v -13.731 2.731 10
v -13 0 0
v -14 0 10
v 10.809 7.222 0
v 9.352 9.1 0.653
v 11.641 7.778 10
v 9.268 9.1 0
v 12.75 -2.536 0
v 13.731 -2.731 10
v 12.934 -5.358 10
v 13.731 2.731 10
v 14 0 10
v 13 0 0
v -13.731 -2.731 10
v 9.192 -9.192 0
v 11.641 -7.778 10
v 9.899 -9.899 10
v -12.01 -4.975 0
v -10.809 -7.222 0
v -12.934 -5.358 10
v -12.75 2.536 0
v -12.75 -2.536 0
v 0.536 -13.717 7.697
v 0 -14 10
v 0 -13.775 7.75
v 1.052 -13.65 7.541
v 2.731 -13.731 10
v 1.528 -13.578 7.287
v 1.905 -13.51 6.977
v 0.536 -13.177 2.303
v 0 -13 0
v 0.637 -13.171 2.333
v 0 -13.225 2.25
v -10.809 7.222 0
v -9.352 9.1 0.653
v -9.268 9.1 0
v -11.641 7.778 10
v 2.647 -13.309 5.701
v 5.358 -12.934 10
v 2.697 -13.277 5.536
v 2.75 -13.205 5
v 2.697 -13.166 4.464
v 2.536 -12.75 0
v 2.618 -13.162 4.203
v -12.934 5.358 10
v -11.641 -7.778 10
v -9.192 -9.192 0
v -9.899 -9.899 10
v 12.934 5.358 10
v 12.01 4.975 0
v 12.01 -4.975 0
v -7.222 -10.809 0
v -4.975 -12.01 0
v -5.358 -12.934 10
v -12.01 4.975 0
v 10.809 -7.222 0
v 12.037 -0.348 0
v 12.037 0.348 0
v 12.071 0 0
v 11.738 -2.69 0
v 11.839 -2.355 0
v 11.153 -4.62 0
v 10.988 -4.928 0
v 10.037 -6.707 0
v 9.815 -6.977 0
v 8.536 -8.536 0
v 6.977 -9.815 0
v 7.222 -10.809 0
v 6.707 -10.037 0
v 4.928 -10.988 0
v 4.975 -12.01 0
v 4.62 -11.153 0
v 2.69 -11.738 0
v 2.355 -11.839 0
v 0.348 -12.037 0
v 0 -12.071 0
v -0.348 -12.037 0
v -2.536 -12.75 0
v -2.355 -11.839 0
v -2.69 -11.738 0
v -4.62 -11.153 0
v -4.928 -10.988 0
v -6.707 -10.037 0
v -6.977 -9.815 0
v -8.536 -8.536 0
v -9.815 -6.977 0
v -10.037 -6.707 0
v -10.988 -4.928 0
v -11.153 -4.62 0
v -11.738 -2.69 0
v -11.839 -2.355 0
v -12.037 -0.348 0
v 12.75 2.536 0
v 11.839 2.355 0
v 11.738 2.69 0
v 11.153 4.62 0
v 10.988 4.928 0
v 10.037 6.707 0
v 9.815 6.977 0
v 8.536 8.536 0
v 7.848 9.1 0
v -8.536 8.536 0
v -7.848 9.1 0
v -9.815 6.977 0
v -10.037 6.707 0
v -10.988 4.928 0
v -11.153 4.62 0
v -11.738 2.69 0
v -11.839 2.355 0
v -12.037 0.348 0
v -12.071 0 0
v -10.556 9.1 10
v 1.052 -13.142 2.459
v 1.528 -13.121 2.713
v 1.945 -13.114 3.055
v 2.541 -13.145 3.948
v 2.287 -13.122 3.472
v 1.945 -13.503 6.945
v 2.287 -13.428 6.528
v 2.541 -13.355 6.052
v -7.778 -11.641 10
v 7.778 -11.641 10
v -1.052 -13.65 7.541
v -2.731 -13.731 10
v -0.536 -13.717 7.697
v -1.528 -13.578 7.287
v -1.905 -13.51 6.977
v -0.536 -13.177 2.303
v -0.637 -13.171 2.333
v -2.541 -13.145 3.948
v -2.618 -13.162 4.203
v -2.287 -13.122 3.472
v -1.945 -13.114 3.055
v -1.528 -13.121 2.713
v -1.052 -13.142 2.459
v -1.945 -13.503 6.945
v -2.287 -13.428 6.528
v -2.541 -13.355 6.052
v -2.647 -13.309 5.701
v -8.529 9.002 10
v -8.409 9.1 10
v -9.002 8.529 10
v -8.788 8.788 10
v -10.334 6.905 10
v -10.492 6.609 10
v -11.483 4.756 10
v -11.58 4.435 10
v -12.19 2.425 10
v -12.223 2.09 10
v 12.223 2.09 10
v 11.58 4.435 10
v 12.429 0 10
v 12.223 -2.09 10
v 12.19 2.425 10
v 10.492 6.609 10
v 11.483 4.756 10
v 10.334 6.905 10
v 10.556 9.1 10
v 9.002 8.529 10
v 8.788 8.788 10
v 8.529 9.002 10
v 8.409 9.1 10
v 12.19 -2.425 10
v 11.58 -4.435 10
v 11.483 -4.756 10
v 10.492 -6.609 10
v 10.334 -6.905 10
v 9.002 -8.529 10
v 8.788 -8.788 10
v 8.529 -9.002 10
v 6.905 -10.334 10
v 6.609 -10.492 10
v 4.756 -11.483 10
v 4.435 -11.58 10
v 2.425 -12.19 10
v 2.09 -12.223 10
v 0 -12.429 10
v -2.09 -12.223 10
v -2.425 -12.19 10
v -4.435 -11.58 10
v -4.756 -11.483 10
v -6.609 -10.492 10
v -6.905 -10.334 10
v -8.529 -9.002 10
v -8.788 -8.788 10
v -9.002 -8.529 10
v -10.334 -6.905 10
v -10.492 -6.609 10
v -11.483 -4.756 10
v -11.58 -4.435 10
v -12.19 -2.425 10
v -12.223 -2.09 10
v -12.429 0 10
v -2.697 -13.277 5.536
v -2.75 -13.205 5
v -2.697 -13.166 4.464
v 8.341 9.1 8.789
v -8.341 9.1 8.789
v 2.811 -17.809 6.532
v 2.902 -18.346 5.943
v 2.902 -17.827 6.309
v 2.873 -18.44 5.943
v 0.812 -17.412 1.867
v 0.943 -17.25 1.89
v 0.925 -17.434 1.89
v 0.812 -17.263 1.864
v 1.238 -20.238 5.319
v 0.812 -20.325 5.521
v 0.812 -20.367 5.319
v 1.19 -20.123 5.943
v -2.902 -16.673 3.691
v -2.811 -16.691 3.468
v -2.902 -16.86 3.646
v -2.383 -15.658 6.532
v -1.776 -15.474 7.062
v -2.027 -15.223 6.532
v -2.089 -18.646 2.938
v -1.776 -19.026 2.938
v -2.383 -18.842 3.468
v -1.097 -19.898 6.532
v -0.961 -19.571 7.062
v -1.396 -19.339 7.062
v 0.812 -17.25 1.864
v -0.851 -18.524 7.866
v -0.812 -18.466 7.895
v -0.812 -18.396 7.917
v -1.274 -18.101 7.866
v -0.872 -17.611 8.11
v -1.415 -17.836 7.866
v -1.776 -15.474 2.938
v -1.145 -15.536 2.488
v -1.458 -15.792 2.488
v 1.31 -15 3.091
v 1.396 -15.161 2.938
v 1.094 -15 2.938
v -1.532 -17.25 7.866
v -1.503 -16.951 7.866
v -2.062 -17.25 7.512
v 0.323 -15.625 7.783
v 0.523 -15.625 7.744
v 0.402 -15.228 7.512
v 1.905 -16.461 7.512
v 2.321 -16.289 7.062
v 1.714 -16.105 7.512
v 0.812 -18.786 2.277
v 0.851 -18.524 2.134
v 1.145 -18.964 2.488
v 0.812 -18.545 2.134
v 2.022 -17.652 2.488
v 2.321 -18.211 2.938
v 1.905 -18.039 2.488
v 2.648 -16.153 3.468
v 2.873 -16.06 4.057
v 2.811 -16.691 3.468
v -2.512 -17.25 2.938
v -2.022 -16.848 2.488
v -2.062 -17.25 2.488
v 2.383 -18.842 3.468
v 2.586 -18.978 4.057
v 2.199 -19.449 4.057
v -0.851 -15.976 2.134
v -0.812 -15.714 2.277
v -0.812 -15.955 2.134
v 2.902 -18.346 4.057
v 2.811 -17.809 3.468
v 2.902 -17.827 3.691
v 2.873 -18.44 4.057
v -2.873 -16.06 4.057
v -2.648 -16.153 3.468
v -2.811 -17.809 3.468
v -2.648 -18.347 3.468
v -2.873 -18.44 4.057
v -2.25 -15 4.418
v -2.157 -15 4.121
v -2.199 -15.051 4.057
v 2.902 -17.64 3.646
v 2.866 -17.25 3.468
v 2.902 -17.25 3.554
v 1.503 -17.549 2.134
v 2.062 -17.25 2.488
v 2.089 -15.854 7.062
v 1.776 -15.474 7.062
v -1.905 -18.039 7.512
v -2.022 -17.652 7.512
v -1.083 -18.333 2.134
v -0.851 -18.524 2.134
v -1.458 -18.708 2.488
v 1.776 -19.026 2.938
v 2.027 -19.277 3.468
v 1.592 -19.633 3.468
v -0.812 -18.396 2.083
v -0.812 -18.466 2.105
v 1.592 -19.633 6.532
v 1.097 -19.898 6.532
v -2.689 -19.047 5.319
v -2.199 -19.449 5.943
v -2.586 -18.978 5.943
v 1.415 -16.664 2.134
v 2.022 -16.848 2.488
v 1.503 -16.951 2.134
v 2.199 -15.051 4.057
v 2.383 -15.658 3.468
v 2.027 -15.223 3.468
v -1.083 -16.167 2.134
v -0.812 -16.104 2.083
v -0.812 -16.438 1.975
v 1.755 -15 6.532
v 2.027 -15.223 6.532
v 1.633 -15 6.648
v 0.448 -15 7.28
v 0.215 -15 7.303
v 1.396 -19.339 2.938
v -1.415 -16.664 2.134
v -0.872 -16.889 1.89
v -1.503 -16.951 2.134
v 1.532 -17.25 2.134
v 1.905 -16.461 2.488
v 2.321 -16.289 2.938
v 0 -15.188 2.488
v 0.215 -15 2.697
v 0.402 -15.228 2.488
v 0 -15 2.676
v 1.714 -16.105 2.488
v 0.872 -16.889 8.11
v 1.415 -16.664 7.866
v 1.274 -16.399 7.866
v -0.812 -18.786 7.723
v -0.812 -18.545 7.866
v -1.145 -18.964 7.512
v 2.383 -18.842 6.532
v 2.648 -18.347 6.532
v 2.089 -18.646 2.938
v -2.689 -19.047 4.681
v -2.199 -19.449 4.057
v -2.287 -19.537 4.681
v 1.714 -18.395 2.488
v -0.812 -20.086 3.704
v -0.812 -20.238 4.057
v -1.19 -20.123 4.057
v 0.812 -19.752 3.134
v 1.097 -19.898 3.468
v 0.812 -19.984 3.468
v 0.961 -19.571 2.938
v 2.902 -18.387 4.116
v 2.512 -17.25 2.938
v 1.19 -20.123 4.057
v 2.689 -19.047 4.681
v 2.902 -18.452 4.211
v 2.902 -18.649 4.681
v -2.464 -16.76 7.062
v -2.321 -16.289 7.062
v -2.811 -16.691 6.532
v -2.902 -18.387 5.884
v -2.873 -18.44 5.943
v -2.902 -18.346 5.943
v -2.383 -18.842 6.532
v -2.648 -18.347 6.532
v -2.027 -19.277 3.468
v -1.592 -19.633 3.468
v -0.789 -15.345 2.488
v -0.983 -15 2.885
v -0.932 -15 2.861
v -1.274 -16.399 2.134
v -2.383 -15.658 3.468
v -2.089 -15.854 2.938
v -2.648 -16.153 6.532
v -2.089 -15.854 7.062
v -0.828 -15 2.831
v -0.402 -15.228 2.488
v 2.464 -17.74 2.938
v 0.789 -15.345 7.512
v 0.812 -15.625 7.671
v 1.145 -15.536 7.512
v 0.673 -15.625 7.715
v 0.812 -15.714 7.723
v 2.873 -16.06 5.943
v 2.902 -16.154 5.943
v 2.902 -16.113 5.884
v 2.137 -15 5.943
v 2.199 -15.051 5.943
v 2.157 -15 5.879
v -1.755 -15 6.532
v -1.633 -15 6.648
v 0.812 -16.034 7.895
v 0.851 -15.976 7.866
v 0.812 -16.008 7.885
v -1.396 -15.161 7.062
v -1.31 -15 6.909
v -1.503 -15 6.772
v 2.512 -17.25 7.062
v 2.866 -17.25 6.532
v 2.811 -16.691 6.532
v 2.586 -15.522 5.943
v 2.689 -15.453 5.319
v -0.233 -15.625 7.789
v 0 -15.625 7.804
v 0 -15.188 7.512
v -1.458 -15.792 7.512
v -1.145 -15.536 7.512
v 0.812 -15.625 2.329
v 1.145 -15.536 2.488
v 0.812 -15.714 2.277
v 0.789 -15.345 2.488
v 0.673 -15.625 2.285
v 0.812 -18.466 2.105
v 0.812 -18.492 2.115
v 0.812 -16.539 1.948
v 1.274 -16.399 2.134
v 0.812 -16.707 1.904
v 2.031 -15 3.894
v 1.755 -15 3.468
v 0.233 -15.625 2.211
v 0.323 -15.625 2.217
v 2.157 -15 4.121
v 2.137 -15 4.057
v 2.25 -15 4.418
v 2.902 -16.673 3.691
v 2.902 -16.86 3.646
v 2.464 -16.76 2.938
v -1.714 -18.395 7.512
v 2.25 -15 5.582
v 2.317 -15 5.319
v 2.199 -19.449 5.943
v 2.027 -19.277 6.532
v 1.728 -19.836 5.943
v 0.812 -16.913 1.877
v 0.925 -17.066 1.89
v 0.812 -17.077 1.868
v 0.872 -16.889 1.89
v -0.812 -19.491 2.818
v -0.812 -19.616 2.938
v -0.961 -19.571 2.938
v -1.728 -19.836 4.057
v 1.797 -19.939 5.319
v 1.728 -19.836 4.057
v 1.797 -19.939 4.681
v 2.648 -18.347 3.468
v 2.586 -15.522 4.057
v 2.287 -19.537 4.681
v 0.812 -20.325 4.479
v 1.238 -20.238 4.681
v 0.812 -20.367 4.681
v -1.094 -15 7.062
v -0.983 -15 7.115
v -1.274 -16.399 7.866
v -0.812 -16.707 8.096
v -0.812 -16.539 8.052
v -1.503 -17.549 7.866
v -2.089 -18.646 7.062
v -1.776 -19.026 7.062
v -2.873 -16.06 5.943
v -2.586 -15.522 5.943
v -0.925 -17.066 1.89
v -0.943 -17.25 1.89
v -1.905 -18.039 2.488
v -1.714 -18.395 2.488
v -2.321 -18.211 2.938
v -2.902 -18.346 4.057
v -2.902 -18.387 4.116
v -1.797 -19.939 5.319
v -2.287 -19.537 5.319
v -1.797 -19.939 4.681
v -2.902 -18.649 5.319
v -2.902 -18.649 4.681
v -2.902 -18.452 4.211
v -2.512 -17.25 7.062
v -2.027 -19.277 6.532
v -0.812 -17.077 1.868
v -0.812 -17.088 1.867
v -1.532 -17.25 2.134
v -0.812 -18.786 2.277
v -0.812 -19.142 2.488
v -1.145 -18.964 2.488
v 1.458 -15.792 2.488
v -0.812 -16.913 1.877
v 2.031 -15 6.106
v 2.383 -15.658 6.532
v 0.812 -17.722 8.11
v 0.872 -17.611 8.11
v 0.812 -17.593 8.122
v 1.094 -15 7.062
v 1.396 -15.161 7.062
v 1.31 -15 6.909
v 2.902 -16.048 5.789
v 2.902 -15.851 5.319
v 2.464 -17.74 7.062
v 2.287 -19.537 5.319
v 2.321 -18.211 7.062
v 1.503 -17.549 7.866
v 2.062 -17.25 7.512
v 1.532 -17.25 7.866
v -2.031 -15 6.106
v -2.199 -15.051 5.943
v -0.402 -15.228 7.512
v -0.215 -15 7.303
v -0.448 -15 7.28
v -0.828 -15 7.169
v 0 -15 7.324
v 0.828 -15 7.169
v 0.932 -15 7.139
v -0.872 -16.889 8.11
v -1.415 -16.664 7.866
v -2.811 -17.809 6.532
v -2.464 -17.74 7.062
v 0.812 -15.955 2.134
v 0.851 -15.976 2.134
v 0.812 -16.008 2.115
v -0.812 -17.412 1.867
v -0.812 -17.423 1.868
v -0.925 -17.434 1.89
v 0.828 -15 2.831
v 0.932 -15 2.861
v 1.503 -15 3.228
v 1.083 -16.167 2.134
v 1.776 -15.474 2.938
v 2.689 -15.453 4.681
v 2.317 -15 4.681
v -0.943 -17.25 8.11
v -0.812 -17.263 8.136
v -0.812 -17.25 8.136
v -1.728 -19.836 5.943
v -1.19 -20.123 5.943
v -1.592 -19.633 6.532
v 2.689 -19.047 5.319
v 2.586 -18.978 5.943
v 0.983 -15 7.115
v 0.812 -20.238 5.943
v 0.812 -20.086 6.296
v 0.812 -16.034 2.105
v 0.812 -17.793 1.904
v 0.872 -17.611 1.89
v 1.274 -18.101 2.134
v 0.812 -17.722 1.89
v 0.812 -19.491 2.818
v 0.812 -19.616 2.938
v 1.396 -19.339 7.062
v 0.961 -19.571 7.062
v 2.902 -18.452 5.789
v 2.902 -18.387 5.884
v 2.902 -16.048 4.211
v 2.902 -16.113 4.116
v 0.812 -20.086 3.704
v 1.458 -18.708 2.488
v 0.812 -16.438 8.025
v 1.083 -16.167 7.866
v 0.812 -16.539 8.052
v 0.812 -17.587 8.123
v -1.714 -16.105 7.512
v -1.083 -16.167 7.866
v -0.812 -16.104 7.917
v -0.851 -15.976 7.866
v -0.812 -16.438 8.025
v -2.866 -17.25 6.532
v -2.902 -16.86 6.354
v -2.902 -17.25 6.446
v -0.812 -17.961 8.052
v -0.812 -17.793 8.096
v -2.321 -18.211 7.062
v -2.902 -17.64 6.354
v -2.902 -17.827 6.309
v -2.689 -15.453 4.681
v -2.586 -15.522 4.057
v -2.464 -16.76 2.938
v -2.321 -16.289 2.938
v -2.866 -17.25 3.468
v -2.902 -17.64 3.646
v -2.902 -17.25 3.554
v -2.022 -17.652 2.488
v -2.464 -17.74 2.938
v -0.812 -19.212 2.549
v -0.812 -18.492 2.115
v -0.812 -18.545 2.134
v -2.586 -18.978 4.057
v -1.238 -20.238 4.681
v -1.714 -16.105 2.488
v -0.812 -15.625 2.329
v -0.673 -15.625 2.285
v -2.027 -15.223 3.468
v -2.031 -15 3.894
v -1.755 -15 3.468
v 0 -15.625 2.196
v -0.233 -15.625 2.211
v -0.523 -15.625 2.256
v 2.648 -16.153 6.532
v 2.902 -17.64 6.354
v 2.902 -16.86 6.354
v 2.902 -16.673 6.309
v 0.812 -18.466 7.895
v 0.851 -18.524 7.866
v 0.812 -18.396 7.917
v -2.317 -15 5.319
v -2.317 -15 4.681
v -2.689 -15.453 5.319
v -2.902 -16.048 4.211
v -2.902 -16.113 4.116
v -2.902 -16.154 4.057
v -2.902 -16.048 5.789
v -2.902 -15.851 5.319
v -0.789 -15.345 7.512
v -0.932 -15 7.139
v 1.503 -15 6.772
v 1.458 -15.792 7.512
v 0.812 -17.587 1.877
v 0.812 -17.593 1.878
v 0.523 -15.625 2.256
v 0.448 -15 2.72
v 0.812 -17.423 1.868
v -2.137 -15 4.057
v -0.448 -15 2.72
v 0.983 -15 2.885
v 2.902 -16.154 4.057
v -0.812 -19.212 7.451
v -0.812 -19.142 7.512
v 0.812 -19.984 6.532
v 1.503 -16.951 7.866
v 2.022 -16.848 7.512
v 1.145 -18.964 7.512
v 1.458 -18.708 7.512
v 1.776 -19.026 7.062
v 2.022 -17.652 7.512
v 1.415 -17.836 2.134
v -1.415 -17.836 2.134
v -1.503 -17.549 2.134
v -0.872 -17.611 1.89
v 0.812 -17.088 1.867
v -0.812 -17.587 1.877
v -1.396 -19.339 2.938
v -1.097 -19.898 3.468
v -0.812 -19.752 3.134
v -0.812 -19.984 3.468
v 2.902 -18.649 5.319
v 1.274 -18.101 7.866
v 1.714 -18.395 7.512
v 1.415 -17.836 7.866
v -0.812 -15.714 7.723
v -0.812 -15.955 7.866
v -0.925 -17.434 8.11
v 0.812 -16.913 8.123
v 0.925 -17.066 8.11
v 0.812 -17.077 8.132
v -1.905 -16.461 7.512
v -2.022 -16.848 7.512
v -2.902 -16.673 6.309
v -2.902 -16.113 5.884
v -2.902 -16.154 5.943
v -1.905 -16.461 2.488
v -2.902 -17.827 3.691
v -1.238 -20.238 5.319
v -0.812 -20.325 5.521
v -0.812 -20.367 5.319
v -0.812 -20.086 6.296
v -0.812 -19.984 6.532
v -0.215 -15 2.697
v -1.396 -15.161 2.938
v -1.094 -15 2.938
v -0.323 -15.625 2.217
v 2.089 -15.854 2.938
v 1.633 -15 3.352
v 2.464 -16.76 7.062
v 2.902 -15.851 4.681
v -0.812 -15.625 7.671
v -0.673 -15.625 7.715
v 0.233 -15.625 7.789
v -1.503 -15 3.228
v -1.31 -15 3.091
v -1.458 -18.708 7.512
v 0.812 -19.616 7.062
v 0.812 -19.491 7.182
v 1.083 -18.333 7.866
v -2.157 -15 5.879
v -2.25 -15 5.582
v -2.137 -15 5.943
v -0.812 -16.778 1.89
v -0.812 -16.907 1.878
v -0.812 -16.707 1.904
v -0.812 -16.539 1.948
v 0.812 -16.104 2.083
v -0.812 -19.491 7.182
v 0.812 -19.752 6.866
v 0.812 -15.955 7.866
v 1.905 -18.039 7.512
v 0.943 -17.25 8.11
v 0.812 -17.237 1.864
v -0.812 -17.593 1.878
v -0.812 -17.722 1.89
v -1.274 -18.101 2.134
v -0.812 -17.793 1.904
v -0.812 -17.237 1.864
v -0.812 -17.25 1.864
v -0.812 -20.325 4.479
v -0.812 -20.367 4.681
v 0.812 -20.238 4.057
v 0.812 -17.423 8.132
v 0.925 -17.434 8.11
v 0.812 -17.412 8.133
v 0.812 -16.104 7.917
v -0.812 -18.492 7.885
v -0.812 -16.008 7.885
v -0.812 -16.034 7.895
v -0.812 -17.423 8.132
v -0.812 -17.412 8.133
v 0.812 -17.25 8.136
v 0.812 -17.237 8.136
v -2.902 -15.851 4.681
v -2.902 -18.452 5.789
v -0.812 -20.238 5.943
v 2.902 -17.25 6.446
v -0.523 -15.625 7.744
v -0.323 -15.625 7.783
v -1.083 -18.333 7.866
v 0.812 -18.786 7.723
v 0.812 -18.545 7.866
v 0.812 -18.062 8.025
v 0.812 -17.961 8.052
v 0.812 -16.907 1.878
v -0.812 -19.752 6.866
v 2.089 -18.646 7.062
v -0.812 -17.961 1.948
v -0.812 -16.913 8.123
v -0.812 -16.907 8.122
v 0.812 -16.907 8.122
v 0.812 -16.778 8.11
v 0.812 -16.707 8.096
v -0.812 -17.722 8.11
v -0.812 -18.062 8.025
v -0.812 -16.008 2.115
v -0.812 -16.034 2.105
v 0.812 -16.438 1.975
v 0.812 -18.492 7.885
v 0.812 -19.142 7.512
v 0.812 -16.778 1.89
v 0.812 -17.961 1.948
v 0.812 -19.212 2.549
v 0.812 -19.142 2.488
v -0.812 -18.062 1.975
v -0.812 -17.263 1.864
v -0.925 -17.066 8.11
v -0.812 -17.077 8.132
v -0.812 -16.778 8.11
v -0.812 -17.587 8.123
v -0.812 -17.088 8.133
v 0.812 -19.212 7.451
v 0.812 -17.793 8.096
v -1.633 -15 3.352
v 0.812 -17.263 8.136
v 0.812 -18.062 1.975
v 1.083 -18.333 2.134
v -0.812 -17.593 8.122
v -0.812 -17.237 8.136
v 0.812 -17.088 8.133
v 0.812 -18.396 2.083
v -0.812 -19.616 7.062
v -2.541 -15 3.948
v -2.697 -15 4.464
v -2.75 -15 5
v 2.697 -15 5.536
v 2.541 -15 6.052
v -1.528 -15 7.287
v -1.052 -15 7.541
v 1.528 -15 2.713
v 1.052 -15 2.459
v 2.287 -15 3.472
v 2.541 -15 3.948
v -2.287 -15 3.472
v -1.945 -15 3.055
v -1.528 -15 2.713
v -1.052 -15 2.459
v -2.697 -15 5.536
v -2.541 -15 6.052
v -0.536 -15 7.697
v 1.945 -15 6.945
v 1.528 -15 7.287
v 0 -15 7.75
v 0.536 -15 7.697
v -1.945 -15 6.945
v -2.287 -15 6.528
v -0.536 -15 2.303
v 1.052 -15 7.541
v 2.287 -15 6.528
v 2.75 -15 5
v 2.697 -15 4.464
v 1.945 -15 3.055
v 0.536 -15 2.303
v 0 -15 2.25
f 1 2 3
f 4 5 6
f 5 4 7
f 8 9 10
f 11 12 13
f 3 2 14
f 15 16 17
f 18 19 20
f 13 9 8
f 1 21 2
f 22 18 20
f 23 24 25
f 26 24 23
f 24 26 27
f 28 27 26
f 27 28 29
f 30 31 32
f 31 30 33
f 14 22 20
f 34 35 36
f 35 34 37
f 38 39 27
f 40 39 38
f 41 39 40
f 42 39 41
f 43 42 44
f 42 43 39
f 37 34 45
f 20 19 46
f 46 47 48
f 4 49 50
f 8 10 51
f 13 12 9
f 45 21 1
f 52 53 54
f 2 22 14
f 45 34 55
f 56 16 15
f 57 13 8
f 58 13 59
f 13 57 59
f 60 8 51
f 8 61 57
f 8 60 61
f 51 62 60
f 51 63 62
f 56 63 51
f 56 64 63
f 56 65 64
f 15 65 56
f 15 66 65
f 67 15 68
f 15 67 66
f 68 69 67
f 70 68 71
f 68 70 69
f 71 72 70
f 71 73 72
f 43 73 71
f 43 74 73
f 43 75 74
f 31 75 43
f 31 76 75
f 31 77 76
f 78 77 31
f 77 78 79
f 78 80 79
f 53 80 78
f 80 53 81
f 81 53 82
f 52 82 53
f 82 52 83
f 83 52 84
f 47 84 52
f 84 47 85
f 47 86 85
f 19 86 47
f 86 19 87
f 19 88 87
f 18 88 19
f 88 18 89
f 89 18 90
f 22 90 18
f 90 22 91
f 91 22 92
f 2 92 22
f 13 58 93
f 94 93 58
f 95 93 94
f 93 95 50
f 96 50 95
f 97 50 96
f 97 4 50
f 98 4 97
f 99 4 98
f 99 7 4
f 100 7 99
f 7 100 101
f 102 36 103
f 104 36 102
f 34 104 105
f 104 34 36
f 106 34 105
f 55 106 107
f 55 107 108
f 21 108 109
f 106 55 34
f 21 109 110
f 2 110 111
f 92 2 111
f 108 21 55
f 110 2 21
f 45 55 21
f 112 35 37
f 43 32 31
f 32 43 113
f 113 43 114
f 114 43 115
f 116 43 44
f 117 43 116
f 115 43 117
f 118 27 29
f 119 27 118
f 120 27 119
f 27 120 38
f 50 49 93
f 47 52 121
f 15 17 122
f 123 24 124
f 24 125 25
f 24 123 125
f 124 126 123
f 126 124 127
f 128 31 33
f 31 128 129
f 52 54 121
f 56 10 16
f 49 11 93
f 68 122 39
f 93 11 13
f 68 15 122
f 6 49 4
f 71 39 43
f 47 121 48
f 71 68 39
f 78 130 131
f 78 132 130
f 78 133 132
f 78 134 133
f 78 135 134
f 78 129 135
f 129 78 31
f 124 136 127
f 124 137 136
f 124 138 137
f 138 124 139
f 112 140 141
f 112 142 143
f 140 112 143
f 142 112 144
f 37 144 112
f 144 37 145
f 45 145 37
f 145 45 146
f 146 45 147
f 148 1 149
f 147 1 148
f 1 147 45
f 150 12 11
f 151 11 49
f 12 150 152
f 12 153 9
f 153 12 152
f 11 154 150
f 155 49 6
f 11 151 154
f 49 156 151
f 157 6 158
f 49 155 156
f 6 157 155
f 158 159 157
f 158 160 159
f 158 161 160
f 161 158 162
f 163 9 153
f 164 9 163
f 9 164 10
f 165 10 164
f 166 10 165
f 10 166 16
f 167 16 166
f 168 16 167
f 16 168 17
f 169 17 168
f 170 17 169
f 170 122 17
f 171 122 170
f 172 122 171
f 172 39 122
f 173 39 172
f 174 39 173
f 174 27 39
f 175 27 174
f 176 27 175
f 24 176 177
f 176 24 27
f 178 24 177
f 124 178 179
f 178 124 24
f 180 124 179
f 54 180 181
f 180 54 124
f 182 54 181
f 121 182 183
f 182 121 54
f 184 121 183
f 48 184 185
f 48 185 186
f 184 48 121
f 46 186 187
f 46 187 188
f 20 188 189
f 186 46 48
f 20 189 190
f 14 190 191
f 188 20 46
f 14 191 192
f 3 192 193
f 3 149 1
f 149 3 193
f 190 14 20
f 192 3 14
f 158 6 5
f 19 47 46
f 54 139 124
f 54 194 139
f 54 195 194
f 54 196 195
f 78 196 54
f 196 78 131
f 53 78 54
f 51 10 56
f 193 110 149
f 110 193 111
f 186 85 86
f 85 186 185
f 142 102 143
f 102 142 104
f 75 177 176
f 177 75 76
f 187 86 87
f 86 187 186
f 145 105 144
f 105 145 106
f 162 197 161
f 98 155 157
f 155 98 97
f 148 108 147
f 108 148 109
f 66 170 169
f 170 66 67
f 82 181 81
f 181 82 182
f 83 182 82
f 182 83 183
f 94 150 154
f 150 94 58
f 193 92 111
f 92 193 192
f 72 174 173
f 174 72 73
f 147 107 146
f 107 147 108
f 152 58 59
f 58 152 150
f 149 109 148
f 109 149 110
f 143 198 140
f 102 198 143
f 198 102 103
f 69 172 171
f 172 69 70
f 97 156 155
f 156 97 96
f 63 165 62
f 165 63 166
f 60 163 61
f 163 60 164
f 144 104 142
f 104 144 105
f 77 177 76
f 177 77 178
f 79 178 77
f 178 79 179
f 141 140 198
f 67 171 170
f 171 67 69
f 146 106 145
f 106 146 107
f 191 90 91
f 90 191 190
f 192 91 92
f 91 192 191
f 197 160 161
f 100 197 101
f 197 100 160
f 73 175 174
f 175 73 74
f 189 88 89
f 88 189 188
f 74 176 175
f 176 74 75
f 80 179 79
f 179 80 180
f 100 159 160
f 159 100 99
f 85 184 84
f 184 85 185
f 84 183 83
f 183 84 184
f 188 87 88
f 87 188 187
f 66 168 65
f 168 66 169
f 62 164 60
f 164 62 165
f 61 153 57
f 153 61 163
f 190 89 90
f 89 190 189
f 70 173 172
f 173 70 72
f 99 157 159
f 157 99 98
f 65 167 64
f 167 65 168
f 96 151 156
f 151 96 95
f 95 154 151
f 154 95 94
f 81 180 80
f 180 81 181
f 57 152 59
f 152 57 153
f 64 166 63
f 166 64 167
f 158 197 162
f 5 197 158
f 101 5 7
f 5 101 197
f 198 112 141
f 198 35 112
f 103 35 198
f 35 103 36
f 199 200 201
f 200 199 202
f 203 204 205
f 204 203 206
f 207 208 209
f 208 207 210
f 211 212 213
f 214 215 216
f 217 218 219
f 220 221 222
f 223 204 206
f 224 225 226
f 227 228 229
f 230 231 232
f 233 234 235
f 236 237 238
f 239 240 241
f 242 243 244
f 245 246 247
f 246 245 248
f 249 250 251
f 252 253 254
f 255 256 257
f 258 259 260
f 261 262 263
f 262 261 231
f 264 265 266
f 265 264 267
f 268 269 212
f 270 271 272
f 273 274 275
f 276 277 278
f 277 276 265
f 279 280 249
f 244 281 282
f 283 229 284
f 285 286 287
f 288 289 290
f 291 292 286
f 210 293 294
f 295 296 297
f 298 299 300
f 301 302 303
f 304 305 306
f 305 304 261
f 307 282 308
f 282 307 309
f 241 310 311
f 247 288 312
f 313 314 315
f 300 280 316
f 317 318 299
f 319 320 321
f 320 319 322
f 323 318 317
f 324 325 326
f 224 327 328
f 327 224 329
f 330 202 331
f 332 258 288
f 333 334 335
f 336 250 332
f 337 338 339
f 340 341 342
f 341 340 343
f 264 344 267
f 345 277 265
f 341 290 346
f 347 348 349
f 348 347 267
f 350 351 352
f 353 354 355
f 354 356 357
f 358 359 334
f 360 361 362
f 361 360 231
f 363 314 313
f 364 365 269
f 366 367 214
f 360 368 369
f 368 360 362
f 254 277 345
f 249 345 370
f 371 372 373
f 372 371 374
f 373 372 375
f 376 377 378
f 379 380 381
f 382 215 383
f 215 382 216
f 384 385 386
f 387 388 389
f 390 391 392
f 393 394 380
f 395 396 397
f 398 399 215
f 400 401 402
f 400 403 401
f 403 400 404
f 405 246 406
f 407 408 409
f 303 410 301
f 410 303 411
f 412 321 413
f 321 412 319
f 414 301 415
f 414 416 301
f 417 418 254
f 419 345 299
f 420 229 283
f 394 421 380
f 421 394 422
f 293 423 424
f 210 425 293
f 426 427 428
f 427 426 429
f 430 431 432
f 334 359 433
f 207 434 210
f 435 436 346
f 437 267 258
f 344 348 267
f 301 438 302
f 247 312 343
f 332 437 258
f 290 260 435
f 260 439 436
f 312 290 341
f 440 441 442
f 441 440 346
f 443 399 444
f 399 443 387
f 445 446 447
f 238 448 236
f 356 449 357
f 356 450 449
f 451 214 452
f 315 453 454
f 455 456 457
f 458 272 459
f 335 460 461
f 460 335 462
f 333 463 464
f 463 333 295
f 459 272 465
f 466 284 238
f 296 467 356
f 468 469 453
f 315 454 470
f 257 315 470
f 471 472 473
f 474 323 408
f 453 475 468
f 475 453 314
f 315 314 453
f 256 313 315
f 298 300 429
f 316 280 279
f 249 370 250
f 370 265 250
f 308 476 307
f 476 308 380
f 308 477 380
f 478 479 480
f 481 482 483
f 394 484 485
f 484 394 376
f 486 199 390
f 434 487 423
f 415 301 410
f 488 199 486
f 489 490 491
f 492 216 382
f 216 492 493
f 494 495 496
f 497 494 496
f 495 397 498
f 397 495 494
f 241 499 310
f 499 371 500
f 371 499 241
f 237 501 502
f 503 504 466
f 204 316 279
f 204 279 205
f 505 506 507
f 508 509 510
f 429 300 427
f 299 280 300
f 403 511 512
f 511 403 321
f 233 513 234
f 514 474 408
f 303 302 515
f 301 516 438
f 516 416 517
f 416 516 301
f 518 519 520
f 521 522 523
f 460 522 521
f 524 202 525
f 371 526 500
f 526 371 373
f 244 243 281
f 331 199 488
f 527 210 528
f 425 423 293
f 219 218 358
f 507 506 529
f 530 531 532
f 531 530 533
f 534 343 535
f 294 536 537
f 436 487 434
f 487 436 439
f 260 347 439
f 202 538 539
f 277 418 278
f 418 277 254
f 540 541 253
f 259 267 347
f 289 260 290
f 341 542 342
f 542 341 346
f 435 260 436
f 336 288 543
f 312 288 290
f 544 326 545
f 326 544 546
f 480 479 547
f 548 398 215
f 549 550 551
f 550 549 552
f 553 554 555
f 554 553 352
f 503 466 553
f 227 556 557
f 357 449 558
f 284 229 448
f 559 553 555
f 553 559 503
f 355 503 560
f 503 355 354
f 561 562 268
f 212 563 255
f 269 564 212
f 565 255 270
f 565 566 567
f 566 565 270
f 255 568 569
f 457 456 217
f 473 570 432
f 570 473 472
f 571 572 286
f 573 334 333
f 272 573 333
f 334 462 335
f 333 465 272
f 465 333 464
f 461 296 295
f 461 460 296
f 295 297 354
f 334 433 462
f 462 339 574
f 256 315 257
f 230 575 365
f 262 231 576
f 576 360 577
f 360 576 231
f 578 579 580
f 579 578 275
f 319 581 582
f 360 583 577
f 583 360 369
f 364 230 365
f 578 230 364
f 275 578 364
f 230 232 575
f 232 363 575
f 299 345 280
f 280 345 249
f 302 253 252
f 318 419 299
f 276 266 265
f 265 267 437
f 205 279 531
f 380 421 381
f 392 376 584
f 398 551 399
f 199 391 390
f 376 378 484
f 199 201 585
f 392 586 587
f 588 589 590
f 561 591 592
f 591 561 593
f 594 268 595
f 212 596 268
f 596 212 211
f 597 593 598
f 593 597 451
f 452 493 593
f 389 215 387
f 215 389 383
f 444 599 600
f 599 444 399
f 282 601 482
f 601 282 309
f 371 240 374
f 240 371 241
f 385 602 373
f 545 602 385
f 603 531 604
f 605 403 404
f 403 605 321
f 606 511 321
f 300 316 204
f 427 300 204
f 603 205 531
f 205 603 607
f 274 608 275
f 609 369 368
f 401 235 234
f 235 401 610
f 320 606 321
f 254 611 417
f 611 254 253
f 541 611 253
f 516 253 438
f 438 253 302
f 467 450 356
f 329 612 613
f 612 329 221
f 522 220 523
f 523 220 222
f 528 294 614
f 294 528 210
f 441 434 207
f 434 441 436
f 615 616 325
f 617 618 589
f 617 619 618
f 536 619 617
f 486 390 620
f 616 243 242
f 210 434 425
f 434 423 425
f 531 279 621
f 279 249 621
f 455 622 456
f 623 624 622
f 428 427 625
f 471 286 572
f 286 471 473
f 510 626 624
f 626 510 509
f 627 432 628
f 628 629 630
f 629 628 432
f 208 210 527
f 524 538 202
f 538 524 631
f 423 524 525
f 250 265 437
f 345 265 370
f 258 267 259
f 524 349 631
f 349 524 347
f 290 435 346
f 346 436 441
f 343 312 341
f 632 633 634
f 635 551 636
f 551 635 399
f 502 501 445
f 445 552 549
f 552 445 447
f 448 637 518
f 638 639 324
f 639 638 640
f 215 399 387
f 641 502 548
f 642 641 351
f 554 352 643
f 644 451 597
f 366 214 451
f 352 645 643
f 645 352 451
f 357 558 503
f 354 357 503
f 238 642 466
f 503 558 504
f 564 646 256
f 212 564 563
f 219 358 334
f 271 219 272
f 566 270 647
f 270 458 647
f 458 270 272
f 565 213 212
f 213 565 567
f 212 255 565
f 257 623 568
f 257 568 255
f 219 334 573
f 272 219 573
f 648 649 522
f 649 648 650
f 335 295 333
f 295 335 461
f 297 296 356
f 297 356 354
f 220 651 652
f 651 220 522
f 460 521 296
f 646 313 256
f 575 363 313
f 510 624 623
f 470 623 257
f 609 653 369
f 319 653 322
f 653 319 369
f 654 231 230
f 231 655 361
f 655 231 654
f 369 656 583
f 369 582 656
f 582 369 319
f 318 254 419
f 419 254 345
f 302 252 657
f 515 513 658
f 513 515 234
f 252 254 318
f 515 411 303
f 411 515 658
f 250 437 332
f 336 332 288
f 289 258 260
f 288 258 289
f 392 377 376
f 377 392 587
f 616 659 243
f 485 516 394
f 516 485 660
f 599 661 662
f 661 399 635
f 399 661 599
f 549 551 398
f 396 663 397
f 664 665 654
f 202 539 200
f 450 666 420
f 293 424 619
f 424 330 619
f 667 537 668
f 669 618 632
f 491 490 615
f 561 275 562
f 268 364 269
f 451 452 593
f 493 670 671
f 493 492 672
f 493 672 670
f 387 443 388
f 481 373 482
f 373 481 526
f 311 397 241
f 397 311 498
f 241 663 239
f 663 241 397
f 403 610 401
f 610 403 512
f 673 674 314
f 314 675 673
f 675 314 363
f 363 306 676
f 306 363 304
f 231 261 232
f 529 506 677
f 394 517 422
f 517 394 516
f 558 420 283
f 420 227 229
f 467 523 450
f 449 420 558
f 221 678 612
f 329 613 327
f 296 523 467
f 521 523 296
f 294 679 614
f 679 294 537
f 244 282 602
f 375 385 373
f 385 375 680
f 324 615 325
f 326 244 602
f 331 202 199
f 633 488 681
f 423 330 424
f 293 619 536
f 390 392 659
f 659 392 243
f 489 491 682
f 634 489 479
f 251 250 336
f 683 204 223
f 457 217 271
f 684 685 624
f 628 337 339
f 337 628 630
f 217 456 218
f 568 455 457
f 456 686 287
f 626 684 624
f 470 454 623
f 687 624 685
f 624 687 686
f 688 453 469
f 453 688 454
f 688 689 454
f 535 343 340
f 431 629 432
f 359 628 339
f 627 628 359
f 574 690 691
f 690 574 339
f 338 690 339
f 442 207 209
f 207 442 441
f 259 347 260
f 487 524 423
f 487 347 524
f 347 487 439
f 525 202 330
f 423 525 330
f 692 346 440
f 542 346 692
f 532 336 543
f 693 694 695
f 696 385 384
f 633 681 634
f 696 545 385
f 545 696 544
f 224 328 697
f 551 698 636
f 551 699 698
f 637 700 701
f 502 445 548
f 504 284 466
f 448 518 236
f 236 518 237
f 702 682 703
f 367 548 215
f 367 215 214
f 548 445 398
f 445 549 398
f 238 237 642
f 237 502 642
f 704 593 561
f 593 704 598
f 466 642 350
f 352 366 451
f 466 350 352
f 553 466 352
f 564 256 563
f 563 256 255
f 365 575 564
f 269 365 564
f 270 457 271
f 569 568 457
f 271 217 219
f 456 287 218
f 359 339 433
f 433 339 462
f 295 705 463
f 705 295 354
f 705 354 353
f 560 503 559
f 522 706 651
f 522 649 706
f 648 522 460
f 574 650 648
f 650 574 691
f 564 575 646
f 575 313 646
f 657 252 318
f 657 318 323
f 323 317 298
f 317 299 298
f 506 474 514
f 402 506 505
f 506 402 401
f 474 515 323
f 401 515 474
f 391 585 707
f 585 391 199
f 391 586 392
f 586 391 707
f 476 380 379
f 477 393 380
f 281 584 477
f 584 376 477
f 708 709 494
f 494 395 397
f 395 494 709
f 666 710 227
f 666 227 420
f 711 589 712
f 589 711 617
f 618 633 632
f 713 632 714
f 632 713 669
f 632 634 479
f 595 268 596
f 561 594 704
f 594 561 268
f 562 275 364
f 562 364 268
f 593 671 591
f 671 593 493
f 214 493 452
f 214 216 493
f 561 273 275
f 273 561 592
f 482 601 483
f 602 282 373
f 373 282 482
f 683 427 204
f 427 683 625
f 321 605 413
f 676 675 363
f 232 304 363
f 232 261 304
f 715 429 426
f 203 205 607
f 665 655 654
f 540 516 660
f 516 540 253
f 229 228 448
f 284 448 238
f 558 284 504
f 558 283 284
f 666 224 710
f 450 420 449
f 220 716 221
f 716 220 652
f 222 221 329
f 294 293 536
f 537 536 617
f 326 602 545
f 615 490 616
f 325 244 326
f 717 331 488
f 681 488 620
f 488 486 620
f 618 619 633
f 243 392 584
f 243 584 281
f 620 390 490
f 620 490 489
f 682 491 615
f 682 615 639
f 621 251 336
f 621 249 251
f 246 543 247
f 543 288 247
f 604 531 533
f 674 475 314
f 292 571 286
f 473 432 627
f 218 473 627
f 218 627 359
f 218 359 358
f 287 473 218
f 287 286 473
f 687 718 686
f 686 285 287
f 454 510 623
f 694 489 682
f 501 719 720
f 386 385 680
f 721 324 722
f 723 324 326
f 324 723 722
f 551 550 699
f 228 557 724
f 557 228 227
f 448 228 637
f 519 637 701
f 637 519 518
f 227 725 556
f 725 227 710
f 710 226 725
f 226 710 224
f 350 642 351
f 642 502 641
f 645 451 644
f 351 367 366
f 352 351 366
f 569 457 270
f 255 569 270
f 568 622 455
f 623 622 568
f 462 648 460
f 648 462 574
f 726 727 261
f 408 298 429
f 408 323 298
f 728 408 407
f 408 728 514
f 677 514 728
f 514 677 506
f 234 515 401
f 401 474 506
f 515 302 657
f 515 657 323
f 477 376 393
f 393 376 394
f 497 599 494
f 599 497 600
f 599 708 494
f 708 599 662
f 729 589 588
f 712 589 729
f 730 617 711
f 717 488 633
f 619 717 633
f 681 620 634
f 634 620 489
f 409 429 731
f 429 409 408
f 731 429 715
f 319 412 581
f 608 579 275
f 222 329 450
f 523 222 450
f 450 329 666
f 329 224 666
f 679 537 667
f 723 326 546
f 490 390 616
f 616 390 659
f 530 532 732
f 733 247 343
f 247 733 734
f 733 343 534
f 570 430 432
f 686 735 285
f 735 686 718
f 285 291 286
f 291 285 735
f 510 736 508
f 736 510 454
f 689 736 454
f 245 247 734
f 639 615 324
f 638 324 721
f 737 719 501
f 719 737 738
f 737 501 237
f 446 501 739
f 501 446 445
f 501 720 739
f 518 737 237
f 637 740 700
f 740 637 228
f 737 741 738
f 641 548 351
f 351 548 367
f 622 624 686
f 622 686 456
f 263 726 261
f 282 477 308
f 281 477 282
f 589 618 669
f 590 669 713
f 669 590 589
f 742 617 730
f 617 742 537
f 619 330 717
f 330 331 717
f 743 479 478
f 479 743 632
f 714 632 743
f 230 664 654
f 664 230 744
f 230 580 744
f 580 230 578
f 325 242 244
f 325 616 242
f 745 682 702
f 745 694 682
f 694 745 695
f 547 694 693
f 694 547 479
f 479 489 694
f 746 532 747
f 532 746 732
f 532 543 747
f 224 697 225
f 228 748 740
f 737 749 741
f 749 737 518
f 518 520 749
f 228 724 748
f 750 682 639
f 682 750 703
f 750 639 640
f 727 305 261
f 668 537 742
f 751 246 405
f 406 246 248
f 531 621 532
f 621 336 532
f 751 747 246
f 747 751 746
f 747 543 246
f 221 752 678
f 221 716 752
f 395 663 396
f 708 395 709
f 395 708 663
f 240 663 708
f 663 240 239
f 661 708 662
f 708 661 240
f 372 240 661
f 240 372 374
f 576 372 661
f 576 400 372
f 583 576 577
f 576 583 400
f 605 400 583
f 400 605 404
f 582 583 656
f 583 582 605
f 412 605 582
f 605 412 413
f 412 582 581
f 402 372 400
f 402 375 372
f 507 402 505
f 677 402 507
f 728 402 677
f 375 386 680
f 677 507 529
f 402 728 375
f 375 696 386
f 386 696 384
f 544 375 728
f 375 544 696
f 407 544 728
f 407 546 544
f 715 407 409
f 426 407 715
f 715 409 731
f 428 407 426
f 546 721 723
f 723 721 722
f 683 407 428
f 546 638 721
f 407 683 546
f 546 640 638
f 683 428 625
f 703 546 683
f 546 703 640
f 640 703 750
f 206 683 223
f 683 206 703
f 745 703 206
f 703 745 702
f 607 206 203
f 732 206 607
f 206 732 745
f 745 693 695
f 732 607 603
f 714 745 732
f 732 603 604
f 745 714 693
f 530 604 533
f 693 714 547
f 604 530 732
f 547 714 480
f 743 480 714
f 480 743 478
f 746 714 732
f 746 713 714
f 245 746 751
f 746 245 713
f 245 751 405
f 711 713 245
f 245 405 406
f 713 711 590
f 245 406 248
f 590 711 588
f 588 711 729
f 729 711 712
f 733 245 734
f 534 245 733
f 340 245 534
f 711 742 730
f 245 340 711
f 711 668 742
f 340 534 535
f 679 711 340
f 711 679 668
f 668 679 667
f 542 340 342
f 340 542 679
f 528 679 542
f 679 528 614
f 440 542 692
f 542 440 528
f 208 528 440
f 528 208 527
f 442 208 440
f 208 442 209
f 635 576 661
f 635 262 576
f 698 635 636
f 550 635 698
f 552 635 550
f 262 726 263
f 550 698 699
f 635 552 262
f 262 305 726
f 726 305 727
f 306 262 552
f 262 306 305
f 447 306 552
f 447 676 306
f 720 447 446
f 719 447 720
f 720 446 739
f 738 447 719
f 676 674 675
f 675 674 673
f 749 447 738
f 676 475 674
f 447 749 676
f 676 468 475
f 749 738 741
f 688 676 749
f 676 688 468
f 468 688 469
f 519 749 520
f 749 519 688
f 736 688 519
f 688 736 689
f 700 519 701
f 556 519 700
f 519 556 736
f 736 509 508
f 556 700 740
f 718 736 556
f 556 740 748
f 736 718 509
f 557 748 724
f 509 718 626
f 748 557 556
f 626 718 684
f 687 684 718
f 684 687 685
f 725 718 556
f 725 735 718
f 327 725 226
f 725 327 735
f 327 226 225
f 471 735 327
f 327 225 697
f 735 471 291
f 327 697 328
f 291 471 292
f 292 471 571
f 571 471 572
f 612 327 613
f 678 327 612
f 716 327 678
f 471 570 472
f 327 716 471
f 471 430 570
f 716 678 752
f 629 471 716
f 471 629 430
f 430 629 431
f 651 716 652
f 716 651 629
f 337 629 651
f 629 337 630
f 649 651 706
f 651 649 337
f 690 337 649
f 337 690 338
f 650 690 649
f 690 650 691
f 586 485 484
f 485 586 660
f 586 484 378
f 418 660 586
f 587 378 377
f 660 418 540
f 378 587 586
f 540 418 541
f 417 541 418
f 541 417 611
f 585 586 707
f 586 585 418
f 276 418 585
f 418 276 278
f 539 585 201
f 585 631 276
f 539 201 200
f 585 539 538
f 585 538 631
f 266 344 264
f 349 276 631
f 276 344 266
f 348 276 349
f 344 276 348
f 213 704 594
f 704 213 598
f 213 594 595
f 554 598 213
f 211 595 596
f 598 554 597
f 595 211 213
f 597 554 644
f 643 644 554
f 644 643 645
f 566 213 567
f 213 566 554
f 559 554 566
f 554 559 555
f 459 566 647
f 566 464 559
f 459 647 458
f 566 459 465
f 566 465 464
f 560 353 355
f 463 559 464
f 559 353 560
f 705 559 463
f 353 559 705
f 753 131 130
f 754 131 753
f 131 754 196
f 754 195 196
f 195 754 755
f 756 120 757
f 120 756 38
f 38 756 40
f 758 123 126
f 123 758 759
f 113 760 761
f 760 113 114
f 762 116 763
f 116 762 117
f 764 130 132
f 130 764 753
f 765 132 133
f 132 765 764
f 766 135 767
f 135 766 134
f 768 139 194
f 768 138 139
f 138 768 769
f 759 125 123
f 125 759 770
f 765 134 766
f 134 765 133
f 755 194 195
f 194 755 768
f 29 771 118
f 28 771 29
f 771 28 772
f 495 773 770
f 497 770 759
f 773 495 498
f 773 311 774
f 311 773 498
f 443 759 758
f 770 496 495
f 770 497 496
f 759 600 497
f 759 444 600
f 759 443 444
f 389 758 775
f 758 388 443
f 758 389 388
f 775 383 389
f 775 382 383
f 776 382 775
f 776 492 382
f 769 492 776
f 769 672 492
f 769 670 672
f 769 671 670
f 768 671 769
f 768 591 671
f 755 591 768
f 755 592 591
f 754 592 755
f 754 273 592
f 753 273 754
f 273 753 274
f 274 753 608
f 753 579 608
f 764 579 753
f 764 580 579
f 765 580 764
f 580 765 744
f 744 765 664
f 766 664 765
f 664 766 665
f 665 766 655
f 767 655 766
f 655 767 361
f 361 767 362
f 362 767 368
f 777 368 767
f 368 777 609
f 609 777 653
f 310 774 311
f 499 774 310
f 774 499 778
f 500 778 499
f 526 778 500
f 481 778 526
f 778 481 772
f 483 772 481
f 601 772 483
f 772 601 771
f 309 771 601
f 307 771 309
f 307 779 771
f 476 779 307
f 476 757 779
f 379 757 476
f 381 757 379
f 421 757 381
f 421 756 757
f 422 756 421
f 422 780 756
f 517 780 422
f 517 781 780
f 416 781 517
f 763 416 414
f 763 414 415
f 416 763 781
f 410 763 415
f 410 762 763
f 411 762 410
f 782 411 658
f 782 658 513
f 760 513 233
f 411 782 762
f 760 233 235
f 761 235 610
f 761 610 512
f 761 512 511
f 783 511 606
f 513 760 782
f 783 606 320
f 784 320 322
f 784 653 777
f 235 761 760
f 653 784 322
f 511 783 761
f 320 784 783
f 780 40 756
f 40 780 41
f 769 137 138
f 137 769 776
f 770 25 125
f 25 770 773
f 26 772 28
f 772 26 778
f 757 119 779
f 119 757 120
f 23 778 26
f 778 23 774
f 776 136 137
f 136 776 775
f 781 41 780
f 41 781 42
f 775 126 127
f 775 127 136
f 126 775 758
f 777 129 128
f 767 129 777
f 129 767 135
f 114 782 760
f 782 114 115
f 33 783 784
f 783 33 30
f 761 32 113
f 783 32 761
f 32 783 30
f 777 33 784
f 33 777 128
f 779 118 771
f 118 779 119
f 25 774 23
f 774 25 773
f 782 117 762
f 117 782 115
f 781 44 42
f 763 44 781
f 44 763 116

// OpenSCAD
// Tool Handle Diameter (in mm); max size is about 24 mm if doing multiple connected
tool_dia = 24;
// Thickness of the tool holder
shell_width = 2;
// Height of your tool holder (10mm is a good guess)
holder_height = 10;
// Peg Hole Size (6.5 is good for US)
peg_size = 6.5;
// Peg Length is the thickness of your peg board
peg_length = 2;
// Peg Spacing, US=25.4; Metric=25??
peg_spacing = 25.4;
// Number of holders
number_of_holders = 1;
// Arrangement, grid, inline, inline_connected
arrangement = "inline"; //[grid, inline]
// Grid rows, duplicates number_of_holders on multiple "rows"
grid_rows = 1;
// Front Cutout Percent; if you want an opening in the front, this is about how much of the ring to cut out.  .25 = 25% is a good start
front_cutout_percent = .15;
// Connected [yes,no] Adds a support brace across each row
connected = "yes"; // [yes,no]

/* [Hidden] */
outer_dia = tool_dia + (shell_width);
$fn=32;


// Loop
if(arrangement=="inline")
    for(n=[0:1:number_of_holders-1])
        translate([n*peg_spacing,0,5]) tool_holder(n);

if(arrangement=="grid")
    for(gr=[0:1:grid_rows-1])
        for(n=[0:1:number_of_holders-1])
            translate([n*peg_spacing,
                      gr*(outer_dia),
                      0]) tool_holder(n);

// Modules
module supports() {
}    

module connector(cn) {
    translate([cn>0?0:cn==0?-peg_spacing/4:peg_spacing/4,
                -outer_dia/2
                ,0]) 
            rotate([0,-90,-90]) 
                cube([holder_height,
                    cn>0?(peg_spacing)
                         :(peg_spacing/2),
                    shell_width*.75],center=true);
}
// tool shell
module tool_holder(hn) {
    rotate([0,-180,0]) union() {
        difference() {
            //outer shell
            cylinder(r1=(outer_dia/2)+(shell_width/2),
                     r2=(outer_dia/2),
                     h=holder_height,center=true);
            //inner cutout
            color("red") cylinder(r1=(outer_dia-(shell_width/2))/2,
                     r2=(tool_dia/2),
                     h=4+holder_height,center=true);
        // opening cutout
            if(front_cutout_percent!=0) translate([0,outer_dia*(1-front_cutout_percent),0]) color("pink") cube([outer_dia,outer_dia,holder_height],center=true);
        }
        // peg body
            union() {
                // peg leg
                color("green") translate([0,-((outer_dia/2)),0]) rotate([90,0,0]) cylinder(r=(peg_size-1)/2,h=peg_length);
                // peg head
                translate([0,-((peg_size/2)+(outer_dia/2)+(peg_length-(shell_width/2))),0]) peg_head();
     if(connected=="yes" && number_of_holders>1)
                if(hn==0)
                    color("red") connector(0); // start
                else if(hn==number_of_holders-1) 
                    color("blue") connector(-1); // end
                else connector(hn); // middle
            }
    }
}
module peg_head() {
    difference() {    
     // peg head
        sphere(r=peg_size/2);
        // peg slot clipping rectangle
        translate([0,-(peg_size/4),0]) rotate([0,0,-90]) cube([peg_size,peg_size/4,peg_size],center=true);
        // peg clipping side rectangles
        translate([-peg_size/1.75,0,0]) rotate([0,0,-90]) cube([peg_size/2,peg_size/4,peg_size],center=true);
        translate([peg_size/1.75,0,0]) rotate([0,0,-90]) cube([peg_size/2,peg_size/4,peg_size],center=true);   
} 
}
